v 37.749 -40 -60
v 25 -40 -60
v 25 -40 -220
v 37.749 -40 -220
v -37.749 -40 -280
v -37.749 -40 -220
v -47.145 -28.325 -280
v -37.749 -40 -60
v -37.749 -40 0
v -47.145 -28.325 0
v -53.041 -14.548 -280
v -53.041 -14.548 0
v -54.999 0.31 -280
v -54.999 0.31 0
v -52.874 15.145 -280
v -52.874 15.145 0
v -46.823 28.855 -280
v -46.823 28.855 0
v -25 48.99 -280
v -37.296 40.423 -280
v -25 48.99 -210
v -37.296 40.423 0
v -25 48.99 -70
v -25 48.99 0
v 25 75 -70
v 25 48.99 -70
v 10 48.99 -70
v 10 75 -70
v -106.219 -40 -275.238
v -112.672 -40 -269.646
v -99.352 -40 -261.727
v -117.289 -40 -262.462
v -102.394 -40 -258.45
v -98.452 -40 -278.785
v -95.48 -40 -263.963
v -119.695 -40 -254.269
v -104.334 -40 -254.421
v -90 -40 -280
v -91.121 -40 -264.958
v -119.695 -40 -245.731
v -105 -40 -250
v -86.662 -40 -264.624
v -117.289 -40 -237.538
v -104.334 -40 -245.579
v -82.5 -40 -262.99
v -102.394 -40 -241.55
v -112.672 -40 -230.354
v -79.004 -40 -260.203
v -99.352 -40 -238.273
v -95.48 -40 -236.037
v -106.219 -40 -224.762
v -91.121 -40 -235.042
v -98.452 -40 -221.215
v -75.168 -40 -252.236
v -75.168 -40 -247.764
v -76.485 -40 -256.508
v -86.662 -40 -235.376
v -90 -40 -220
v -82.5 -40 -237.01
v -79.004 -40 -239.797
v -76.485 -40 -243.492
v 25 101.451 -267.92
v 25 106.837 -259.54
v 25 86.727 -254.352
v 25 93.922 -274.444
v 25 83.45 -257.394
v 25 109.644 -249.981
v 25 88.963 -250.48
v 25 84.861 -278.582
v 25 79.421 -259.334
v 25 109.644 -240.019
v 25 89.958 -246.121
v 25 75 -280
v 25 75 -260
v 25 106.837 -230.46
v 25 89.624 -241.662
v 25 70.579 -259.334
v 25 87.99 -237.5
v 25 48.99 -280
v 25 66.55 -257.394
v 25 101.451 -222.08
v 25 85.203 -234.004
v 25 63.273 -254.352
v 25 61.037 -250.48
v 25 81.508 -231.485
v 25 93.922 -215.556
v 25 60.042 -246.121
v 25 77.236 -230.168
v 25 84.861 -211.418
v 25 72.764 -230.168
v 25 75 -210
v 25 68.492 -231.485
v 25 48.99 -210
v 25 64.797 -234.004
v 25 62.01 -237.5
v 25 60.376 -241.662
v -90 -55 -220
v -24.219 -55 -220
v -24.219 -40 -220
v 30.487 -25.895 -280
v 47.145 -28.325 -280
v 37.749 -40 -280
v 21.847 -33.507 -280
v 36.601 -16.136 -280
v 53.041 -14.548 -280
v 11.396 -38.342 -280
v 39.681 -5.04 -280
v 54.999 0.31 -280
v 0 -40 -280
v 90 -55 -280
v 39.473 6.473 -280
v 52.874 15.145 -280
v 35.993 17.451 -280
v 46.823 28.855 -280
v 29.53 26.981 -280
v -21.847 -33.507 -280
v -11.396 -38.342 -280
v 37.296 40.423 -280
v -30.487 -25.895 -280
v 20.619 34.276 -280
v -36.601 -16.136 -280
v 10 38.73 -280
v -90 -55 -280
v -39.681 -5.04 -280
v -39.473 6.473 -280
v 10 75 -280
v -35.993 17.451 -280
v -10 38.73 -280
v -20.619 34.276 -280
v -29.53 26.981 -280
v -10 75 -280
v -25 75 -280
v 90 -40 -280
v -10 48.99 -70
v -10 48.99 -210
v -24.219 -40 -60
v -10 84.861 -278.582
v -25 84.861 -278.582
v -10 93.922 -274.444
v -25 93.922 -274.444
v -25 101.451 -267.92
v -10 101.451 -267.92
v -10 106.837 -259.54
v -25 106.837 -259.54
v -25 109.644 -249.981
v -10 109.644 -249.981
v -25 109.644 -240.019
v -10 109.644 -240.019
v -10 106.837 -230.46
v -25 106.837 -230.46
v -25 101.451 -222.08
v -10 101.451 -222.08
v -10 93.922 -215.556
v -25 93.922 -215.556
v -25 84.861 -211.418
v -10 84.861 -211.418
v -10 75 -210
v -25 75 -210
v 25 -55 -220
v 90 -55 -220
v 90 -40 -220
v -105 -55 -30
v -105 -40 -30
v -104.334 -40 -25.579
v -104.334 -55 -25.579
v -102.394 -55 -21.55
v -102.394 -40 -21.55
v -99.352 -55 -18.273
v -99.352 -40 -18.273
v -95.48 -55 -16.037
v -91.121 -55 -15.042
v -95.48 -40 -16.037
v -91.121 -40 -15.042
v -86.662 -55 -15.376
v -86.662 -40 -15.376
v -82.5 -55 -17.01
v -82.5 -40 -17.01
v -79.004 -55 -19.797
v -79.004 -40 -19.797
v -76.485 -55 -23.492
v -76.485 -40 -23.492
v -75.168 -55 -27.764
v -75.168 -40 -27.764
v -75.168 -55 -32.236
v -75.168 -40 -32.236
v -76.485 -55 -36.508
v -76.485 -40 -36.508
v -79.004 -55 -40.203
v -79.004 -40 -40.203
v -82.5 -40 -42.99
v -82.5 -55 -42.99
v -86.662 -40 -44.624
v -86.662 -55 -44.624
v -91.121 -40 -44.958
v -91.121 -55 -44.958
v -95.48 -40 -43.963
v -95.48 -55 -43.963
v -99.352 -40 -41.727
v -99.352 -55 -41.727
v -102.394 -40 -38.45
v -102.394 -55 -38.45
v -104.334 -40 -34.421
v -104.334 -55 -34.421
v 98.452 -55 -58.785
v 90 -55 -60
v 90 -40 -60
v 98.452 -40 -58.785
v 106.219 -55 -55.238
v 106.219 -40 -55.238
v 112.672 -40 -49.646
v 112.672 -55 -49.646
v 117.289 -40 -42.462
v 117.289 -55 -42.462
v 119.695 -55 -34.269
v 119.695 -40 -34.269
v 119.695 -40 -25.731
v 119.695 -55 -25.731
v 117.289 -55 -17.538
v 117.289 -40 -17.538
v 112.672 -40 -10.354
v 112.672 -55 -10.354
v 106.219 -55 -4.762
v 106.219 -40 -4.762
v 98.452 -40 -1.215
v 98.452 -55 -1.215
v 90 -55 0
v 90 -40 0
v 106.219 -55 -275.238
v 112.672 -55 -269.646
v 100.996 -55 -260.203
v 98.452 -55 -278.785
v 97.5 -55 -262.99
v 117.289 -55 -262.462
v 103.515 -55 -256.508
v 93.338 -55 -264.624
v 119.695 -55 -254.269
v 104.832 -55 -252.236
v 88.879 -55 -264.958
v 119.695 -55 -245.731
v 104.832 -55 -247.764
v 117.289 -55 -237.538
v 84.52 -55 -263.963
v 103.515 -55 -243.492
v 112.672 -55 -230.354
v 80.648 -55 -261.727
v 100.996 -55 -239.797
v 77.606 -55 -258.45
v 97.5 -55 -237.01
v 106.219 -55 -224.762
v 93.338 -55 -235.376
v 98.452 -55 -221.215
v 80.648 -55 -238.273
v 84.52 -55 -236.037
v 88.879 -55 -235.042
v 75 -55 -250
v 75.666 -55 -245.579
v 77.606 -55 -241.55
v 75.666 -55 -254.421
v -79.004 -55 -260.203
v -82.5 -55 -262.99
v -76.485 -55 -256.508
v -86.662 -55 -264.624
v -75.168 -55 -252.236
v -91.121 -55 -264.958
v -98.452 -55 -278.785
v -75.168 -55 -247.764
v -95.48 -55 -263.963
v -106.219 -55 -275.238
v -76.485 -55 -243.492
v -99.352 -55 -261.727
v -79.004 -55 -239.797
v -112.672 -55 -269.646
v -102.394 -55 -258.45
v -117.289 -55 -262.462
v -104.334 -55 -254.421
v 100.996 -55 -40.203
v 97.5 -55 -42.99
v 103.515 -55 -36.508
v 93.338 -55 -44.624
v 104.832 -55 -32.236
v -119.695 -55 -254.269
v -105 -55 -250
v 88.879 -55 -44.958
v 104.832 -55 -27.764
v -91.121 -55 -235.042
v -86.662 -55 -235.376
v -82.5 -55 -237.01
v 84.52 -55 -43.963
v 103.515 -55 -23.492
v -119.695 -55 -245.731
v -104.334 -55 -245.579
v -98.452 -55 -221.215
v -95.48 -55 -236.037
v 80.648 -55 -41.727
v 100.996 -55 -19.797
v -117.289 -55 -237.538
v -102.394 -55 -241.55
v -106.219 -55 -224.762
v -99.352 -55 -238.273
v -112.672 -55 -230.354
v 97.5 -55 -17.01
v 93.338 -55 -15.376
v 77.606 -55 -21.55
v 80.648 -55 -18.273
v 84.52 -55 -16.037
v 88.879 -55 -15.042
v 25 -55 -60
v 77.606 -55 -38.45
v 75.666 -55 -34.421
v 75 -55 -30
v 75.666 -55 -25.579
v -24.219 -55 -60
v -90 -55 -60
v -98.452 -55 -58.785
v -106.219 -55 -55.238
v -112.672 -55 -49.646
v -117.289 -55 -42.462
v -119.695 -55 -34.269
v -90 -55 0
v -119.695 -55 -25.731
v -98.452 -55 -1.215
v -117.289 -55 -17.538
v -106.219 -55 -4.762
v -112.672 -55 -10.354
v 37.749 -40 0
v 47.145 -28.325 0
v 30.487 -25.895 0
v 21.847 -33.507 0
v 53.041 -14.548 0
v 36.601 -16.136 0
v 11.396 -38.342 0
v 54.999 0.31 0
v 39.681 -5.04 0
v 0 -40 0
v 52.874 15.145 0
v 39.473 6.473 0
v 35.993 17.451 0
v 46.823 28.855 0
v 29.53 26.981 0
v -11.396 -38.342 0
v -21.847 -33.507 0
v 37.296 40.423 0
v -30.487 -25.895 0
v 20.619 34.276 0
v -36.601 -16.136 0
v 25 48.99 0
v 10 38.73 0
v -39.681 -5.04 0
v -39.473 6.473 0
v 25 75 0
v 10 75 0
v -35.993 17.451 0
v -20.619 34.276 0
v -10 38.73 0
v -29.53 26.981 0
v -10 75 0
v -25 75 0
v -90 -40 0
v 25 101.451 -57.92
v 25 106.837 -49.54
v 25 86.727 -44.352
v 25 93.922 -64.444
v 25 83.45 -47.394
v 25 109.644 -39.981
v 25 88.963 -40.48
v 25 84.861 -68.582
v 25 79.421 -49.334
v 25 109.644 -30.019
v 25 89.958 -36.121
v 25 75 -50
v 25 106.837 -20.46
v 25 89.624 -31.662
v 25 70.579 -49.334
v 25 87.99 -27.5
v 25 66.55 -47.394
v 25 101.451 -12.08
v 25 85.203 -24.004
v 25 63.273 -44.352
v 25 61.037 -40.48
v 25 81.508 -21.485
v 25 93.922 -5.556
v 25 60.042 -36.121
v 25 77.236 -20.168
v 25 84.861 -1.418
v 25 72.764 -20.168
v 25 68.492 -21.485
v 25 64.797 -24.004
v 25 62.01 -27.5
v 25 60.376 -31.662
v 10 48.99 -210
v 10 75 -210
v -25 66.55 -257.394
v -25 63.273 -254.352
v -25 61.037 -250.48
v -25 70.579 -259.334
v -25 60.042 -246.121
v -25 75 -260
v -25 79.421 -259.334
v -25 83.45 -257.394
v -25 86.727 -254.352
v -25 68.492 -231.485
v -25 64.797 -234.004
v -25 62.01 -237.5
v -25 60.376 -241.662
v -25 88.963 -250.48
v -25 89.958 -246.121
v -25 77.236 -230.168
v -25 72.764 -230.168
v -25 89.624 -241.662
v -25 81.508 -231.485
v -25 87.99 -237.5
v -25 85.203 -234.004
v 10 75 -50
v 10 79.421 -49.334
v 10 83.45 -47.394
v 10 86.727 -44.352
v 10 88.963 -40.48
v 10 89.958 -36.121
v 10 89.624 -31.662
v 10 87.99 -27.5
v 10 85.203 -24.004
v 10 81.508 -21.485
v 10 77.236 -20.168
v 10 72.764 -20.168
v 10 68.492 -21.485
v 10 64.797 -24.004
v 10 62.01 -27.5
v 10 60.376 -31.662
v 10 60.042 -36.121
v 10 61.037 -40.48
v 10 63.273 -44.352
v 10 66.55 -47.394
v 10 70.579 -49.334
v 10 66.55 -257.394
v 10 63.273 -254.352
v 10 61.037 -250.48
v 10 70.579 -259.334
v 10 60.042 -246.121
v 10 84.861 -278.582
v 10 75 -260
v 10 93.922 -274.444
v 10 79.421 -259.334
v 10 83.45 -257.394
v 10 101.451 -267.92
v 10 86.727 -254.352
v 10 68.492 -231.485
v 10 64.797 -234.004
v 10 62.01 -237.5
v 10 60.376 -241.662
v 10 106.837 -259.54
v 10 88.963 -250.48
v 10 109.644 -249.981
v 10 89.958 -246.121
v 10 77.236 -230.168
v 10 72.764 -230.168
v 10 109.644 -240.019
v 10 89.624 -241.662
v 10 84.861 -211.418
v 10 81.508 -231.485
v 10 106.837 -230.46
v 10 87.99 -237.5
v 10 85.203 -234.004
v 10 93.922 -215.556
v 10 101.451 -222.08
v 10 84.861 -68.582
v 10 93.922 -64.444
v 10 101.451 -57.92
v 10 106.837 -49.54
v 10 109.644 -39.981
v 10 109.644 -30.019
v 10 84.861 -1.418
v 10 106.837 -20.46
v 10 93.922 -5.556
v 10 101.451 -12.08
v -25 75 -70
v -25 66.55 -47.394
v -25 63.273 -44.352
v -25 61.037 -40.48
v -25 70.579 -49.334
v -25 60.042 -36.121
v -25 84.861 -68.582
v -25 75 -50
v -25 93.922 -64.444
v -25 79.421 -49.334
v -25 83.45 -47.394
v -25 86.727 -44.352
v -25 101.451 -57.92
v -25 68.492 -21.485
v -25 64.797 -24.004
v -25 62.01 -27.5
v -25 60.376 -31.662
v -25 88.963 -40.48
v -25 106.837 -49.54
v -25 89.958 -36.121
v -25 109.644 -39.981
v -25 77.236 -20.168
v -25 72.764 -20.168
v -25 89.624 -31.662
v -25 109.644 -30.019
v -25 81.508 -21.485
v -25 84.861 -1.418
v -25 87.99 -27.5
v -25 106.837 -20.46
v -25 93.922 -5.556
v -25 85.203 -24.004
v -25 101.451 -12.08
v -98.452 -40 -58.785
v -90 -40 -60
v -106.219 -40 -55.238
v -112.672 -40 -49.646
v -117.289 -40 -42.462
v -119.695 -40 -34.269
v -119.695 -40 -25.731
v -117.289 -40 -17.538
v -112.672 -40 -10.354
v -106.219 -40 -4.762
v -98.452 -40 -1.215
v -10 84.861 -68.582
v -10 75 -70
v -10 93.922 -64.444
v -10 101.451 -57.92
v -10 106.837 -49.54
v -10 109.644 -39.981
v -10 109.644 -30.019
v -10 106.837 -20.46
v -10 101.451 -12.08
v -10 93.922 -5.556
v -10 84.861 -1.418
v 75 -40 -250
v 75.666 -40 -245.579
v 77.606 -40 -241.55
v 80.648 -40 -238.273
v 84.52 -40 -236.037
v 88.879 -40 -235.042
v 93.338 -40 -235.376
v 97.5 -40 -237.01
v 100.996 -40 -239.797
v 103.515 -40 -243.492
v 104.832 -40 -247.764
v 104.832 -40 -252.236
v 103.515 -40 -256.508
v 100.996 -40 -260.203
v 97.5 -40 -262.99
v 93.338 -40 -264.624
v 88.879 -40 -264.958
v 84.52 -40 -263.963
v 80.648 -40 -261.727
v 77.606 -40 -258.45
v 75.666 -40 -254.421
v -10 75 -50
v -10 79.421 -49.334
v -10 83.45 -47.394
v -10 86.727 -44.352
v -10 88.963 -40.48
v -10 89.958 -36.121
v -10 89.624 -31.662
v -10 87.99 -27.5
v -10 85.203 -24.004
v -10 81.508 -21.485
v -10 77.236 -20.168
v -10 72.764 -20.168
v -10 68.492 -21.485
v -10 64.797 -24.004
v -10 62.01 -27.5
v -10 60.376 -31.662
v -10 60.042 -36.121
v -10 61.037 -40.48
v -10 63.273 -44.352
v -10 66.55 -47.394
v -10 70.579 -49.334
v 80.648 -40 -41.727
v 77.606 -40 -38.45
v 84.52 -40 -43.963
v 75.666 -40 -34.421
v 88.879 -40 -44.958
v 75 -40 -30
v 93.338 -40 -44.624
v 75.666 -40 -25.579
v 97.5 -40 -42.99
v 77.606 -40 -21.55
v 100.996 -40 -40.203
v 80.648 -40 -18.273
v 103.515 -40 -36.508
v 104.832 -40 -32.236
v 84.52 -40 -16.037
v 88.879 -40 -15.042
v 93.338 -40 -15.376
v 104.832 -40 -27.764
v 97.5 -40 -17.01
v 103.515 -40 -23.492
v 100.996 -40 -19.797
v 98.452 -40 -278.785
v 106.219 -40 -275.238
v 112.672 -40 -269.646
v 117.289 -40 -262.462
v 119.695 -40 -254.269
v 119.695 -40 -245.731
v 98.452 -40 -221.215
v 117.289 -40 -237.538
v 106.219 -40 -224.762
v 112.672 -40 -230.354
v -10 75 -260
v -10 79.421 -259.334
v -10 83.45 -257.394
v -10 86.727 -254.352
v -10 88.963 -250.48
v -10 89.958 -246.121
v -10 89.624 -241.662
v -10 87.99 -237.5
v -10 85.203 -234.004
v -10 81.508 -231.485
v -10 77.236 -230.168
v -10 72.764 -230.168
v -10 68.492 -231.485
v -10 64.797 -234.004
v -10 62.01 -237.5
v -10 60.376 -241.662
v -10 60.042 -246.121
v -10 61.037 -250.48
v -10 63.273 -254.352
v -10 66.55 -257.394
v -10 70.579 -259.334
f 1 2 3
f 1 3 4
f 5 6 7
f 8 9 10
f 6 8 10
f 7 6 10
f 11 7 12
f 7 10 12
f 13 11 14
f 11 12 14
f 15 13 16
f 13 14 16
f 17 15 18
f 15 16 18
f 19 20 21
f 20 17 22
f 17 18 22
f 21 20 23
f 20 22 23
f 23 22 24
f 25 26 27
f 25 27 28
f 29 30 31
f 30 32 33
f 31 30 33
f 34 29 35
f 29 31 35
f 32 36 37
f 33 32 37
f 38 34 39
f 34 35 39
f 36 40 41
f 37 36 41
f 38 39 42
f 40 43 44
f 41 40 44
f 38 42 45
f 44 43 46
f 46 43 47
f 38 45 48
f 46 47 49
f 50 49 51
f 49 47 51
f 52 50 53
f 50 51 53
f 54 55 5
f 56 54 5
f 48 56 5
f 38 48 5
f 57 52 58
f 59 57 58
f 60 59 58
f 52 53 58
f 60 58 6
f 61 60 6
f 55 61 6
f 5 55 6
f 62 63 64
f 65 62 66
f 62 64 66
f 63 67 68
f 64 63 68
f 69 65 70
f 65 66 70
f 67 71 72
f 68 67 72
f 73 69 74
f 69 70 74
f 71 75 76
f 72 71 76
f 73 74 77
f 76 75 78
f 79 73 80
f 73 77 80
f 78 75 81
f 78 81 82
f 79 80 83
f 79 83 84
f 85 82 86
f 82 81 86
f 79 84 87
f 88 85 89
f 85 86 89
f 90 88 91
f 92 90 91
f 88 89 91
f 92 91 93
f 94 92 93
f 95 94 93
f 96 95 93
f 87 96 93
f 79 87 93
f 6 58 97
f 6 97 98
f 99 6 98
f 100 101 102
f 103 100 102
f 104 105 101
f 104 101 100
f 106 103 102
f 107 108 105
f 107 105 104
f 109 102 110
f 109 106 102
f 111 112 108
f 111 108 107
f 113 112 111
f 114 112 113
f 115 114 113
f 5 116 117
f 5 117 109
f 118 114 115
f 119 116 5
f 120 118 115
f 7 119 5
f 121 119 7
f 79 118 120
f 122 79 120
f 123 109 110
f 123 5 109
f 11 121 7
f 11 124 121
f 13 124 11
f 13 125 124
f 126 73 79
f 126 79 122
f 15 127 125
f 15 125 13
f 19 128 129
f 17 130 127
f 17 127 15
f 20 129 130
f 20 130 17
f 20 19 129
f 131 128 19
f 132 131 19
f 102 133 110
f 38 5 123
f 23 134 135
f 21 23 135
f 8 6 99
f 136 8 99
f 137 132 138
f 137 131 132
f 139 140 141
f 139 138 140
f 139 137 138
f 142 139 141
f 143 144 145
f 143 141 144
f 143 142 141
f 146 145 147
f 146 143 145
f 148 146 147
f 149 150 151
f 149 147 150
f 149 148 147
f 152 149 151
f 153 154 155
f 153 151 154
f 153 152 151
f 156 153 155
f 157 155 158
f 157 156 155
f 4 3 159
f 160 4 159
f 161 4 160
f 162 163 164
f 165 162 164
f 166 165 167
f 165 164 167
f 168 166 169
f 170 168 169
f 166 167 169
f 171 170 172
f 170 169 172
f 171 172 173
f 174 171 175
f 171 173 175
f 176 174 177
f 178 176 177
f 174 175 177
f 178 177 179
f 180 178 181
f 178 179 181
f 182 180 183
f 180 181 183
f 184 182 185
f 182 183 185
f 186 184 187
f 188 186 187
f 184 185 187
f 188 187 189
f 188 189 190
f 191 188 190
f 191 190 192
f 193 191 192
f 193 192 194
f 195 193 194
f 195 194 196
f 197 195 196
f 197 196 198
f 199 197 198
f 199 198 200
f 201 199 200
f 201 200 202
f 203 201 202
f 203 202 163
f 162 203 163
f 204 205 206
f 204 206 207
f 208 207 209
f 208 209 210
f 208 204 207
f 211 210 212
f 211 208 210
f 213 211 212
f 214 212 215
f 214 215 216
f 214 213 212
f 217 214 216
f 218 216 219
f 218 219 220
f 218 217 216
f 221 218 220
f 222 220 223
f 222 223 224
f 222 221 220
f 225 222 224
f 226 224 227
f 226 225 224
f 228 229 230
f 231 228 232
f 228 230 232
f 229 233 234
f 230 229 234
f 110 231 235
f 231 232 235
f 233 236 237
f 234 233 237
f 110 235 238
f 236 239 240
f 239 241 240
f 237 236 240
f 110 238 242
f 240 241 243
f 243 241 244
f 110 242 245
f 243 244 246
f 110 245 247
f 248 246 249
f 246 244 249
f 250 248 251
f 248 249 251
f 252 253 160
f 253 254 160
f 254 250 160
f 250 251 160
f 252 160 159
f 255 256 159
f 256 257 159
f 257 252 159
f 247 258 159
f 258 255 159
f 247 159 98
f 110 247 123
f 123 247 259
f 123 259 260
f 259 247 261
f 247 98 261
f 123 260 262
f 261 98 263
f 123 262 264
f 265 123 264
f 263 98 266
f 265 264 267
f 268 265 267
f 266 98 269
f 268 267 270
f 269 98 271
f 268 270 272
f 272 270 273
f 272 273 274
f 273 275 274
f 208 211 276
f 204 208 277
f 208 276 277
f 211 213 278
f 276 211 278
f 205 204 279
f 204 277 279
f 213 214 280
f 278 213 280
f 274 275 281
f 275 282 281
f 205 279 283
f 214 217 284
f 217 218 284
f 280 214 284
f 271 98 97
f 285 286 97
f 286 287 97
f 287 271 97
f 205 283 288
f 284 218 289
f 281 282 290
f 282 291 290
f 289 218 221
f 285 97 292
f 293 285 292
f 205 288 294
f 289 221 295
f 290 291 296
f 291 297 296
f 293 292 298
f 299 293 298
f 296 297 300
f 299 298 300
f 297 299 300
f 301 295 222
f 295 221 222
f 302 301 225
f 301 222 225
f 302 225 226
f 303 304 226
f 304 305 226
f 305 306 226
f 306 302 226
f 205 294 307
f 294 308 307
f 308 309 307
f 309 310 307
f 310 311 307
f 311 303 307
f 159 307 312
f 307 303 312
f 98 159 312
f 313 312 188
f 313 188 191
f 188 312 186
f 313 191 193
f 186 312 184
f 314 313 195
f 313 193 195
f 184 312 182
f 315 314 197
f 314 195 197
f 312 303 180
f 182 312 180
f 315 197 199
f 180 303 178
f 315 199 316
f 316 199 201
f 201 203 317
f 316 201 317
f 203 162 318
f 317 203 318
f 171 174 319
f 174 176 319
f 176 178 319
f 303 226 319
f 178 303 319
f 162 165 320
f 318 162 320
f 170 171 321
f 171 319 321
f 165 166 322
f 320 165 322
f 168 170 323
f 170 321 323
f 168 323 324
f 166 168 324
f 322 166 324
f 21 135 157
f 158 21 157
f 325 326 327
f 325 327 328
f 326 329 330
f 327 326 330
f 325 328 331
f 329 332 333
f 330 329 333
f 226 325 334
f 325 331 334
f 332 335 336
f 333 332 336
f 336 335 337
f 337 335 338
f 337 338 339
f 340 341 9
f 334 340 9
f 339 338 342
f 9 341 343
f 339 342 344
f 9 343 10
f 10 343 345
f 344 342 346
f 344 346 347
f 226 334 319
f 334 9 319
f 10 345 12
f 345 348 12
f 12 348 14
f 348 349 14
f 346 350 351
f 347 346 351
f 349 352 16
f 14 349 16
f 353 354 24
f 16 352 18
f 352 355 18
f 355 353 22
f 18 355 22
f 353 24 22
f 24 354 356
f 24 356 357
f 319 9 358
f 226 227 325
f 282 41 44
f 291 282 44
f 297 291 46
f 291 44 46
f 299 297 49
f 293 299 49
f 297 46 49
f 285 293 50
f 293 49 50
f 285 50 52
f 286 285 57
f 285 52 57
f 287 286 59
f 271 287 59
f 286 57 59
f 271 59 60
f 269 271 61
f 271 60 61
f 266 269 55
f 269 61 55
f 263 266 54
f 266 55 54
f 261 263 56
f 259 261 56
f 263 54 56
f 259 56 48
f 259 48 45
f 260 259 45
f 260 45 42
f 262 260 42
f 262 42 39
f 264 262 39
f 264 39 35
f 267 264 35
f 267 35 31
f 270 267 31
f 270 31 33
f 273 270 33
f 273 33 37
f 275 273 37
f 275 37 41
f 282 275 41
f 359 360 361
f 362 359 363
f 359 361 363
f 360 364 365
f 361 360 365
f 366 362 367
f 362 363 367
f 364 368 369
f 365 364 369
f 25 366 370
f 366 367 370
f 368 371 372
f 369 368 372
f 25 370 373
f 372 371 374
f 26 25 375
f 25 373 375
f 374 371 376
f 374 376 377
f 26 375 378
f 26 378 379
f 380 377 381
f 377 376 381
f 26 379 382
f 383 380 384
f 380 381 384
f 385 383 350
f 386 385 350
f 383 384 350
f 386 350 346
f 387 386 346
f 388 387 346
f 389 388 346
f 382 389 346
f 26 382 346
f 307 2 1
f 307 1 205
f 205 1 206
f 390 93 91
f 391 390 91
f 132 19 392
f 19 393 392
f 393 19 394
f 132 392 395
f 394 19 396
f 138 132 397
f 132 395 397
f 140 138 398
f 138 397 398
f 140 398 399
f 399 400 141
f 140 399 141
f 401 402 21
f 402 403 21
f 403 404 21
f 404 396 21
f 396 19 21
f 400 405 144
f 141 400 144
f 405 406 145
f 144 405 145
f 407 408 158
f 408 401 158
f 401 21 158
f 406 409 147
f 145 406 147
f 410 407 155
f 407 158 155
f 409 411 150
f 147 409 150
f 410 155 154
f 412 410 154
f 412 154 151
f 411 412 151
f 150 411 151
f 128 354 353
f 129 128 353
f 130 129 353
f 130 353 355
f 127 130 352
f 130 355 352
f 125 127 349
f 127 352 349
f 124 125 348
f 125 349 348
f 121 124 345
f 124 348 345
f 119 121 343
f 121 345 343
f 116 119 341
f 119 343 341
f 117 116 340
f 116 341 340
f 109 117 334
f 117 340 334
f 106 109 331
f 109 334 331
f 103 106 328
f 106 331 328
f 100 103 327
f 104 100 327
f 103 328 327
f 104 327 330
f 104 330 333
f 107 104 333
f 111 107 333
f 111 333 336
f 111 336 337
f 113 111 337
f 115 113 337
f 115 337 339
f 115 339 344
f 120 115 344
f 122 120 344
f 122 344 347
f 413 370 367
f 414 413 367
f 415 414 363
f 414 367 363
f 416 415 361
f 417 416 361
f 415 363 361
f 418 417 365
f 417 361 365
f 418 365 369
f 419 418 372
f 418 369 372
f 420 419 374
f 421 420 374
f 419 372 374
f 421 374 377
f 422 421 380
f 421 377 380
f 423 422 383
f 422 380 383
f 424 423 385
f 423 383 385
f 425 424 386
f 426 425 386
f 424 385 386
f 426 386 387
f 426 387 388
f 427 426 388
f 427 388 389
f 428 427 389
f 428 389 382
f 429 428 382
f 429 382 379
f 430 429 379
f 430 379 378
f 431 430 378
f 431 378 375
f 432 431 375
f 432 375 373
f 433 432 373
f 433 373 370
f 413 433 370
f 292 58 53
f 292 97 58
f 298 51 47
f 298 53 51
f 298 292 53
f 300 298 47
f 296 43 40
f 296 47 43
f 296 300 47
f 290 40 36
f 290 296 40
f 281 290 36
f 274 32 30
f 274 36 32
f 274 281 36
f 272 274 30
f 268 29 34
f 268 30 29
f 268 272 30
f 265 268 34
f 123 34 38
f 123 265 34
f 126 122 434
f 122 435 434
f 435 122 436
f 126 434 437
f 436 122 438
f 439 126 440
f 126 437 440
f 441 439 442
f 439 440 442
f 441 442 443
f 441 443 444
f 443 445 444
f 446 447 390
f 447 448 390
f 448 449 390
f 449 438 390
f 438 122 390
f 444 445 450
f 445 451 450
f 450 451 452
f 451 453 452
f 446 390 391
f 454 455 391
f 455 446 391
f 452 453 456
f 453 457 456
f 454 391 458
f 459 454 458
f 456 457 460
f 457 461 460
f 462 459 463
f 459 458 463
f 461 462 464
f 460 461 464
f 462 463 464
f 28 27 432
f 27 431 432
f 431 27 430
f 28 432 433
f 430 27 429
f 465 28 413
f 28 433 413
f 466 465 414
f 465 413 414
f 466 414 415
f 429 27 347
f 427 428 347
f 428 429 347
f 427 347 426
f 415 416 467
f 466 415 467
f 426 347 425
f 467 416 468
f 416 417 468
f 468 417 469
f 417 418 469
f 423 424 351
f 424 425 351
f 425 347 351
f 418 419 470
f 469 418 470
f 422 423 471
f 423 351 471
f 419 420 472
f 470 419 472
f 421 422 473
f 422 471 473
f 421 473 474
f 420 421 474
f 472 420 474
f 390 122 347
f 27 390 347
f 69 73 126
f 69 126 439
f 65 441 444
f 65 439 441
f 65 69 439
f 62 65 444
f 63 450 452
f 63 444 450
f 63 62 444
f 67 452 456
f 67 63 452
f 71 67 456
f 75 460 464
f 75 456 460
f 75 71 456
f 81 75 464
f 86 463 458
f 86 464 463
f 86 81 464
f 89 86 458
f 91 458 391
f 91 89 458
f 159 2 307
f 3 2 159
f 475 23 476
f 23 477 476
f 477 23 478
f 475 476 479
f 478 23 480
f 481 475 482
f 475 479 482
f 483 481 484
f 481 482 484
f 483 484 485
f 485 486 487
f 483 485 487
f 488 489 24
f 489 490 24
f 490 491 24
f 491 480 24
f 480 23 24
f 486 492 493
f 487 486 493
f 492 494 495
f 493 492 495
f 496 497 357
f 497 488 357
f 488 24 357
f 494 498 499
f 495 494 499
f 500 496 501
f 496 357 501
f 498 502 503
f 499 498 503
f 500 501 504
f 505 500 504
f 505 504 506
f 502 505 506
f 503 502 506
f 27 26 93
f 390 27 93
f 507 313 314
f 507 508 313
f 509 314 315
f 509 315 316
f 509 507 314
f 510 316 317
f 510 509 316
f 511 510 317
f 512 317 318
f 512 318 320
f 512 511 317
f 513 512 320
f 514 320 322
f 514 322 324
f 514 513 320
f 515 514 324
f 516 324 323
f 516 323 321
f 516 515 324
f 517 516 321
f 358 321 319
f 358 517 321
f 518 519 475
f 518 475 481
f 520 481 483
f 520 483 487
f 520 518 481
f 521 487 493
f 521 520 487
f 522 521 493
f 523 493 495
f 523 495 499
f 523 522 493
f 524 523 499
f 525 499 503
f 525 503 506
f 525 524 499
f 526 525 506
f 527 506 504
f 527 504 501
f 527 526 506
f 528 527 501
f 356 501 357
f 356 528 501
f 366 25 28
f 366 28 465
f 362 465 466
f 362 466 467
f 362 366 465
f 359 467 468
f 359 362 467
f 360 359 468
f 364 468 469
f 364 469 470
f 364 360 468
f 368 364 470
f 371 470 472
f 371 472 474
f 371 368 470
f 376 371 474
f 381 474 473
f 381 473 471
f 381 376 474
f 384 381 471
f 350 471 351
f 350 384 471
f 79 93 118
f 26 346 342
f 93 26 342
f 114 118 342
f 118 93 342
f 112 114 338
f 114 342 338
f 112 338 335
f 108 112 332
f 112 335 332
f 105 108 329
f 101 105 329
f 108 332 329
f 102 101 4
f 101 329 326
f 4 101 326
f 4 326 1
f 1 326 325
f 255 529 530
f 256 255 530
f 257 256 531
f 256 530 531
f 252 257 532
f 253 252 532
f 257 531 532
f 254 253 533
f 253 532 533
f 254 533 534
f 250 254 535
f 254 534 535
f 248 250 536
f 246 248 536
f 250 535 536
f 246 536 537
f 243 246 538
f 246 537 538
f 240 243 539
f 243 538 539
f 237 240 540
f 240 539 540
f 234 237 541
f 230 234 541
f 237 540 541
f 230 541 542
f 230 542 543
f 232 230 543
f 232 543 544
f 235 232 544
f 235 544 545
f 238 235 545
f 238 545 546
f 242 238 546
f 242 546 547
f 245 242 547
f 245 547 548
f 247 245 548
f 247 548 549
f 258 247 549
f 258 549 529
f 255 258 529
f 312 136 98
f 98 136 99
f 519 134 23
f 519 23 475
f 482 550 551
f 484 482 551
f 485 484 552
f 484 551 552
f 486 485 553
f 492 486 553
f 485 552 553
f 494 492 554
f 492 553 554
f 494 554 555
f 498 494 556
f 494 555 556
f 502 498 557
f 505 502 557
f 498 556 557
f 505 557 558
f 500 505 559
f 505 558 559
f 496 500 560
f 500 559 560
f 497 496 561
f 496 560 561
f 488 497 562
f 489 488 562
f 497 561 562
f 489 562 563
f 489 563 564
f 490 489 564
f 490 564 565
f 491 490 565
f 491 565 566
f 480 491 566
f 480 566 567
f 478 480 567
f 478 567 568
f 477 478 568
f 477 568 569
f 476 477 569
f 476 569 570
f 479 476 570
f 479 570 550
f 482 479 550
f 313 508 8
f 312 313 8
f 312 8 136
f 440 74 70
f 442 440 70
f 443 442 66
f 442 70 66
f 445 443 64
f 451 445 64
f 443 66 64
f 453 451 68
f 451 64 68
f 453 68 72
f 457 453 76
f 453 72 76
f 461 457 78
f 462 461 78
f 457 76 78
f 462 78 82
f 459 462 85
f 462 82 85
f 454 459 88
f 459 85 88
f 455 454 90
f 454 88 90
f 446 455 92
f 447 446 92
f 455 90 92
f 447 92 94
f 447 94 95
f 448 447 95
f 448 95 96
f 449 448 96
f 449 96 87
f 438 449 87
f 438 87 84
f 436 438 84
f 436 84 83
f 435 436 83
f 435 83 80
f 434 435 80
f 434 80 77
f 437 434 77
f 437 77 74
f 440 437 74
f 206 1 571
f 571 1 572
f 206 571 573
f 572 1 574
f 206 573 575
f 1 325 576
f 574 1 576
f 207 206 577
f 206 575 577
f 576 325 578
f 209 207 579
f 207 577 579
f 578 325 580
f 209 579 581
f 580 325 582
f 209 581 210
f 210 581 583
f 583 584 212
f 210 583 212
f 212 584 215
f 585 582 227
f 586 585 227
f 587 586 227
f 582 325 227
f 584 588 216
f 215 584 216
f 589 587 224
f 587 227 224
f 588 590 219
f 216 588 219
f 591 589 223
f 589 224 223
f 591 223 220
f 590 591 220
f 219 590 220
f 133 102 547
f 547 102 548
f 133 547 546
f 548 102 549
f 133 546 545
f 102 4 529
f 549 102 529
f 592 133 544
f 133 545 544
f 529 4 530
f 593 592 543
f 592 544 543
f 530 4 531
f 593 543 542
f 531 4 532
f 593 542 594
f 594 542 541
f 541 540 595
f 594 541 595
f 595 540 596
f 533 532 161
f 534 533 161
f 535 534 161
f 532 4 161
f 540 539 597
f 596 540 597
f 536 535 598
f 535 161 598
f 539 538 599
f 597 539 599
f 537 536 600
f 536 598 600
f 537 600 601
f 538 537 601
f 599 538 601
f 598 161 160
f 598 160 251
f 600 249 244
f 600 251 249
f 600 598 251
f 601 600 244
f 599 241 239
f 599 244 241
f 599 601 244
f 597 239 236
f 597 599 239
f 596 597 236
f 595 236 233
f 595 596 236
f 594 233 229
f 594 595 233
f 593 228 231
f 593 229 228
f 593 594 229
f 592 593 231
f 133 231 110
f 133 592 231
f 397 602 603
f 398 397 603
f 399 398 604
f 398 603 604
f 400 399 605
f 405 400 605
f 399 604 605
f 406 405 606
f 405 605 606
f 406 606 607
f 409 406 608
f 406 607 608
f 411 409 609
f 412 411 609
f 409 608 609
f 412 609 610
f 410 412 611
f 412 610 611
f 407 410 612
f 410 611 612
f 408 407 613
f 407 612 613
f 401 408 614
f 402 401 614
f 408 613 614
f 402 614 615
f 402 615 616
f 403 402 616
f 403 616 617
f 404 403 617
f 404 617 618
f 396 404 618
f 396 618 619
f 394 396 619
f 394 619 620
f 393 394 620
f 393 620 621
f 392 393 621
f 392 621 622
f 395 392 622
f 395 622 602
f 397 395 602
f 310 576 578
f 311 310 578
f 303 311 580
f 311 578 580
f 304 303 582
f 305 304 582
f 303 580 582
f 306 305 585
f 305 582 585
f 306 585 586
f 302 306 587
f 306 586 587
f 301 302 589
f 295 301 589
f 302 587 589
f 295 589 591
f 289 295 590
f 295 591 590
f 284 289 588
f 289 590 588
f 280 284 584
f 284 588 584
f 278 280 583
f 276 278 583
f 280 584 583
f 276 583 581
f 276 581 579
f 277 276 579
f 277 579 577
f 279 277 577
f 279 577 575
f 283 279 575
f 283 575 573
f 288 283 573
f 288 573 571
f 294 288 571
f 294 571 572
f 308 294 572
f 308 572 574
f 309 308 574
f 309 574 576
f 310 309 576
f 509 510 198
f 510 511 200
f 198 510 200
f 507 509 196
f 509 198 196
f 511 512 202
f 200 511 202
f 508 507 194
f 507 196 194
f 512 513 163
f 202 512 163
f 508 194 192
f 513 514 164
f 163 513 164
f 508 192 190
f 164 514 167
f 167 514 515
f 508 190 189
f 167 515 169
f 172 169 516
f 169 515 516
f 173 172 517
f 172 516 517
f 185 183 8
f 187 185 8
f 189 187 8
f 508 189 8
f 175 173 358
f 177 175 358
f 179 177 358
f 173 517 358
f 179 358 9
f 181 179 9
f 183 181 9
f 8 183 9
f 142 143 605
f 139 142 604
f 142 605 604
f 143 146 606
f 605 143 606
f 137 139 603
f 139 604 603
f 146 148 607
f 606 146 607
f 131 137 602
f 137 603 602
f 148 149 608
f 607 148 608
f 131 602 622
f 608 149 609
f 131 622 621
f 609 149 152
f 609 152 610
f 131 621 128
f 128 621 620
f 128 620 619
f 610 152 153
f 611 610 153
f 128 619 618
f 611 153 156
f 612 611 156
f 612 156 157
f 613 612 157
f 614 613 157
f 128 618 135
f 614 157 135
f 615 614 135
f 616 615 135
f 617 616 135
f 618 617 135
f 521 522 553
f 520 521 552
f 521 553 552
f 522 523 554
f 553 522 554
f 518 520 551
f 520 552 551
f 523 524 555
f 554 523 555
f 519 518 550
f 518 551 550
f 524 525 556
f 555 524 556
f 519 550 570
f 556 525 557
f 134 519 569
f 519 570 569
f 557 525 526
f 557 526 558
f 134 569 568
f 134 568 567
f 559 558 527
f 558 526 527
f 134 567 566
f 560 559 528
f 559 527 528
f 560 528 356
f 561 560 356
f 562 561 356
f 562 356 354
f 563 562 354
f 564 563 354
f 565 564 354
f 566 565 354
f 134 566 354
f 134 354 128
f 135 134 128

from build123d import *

# Parameters (mm, degrees)
BOSS_EXTRUDE1_DEPTH = 280
SKETCH5_W           = 95
SKETCH5_H           = 160
SKETCH5_W_2         = 95.780958046
CUT_EXTRUDE9_DEPTH  = 280
FILLET1_RADIUS      = 30
FILLET1_LENGTH      = 15
FILLET2_RADIUS      = 30
FILLET2_LENGTH      = 15
FILLET3_RADIUS      = 30
FILLET3_LENGTH      = 15
FILLET4_RADIUS      = 30
FILLET4_LENGTH      = 15
SKETCH7_R           = 15
CUT_EXTRUDE10_DEPTH = 280
SKETCH8_W           = 140
SKETCH8_H           = 61.010205144
CUT_EXTRUDE11_DEPTH = 280
FILLET5_RADIUS      = 35
FILLET5_LENGTH      = 15
FILLET6_RADIUS      = 35
FILLET6_LENGTH      = 15
FILLET7_RADIUS      = 35
FILLET7_LENGTH      = 15
FILLET8_RADIUS      = 35
FILLET8_LENGTH      = 15
SKETCH9_R           = 15
CUT_EXTRUDE12_DEPTH = 280


with BuildPart() as part:
    # Sketch1 → Boss-Extrude1 (new body)
    with BuildSketch(Plane.XY):
        with BuildLine():
            Line((-120, -40), (-37.749172176, -40))
            ThreePointArc((-37.749172176, -40), (-54.444104817, 7.799964787), (-25, 48.989794856))
            Line((-25, 48.989794856), (-25, 110))
            Line((-25, 110), (-10, 110))
            Line((-10, 110), (-10, 38.729833462))
            ThreePointArc((-10, 38.729833462), (0, -40), (10, 38.729833462))
            Line((10, 38.729833462), (10, 110))
            Line((10, 110), (25, 110))
            Line((25, 110), (25, 48.989794856))
            ThreePointArc((25, 48.989794856), (54.444104817, 7.799964787), (37.749172176, -40))
            Line((37.749172176, -40), (120, -40))
            Line((120, -40), (120, -55))
            Line((120, -55), (-120, -55))
            Line((-120, -55), (-120, -40))
        make_face()
    extrude(amount=-BOSS_EXTRUDE1_DEPTH)

    # Sketch5 → Cut-Extrude9 (cut)
    with BuildSketch(Plane(origin=(0, -40, 0), x_dir=(1, 0, 0), z_dir=(0, 1, 0))):
        with Locations((72.5, 140)):
            Rectangle(SKETCH5_W, SKETCH5_H)
        with Locations((-72.109520977, 140)):
            Rectangle(SKETCH5_W_2, SKETCH5_H)
    extrude(amount=-CUT_EXTRUDE9_DEPTH, mode=Mode.SUBTRACT)

    # Fillet1: full round fillet: the end face becomes a half cylinder, R = half its width
    fillet1_face = Plane((-120, -47.5, -250), x_dir=(0, -1, 0), z_dir=(-1, 0, 0))  # on the end face: x along it, z out of the body
    fillet1_slab = fillet1_face.offset(-FILLET1_RADIUS / 2) * Box(FILLET1_LENGTH, 2 * FILLET1_RADIUS, FILLET1_RADIUS, mode=Mode.PRIVATE)  # the body's end, R deep
    fillet1_round = Plane((-90, -47.5, -250), x_dir=(-1, 0, 0), z_dir=(0, -1, 0)) * Cylinder(FILLET1_RADIUS, FILLET1_LENGTH, mode=Mode.PRIVATE)  # its axis R under the face
    add(fillet1_slab - fillet1_round, mode=Mode.SUBTRACT)

    # Fillet2: full round fillet: the end face becomes a half cylinder, R = half its width
    fillet2_face = Plane((-120, -47.5, -30), x_dir=(0, 1, 0), z_dir=(-1, 0, 0))  # on the end face: x along it, z out of the body
    fillet2_slab = fillet2_face.offset(-FILLET2_RADIUS / 2) * Box(FILLET2_LENGTH, 2 * FILLET2_RADIUS, FILLET2_RADIUS, mode=Mode.PRIVATE)  # the body's end, R deep
    fillet2_round = Plane((-90, -47.5, -30), x_dir=(-1, 0, 0), z_dir=(0, 1, 0)) * Cylinder(FILLET2_RADIUS, FILLET2_LENGTH, mode=Mode.PRIVATE)  # its axis R under the face
    add(fillet2_slab - fillet2_round, mode=Mode.SUBTRACT)

    # Fillet3: full round fillet: the end face becomes a half cylinder, R = half its width
    fillet3_face = Plane((120, -47.5, -250), x_dir=(0, 1, 0), z_dir=(1, 0, 0))  # on the end face: x along it, z out of the body
    fillet3_slab = fillet3_face.offset(-FILLET3_RADIUS / 2) * Box(FILLET3_LENGTH, 2 * FILLET3_RADIUS, FILLET3_RADIUS, mode=Mode.PRIVATE)  # the body's end, R deep
    fillet3_round = Plane((90, -47.5, -250), x_dir=(1, 0, 0), z_dir=(0, 1, 0)) * Cylinder(FILLET3_RADIUS, FILLET3_LENGTH, mode=Mode.PRIVATE)  # its axis R under the face
    add(fillet3_slab - fillet3_round, mode=Mode.SUBTRACT)

    # Fillet4: full round fillet: the end face becomes a half cylinder, R = half its width
    fillet4_face = Plane((120, -47.5, -30), x_dir=(0, -1, 0), z_dir=(1, 0, 0))  # on the end face: x along it, z out of the body
    fillet4_slab = fillet4_face.offset(-FILLET4_RADIUS / 2) * Box(FILLET4_LENGTH, 2 * FILLET4_RADIUS, FILLET4_RADIUS, mode=Mode.PRIVATE)  # the body's end, R deep
    fillet4_round = Plane((90, -47.5, -30), x_dir=(1, 0, 0), z_dir=(0, -1, 0)) * Cylinder(FILLET4_RADIUS, FILLET4_LENGTH, mode=Mode.PRIVATE)  # its axis R under the face
    add(fillet4_slab - fillet4_round, mode=Mode.SUBTRACT)

    # Sketch7 → Cut-Extrude10 (cut)
    with BuildSketch(Plane(origin=(0, -40, 0), x_dir=(1, 0, 0), z_dir=(0, 1, 0))):
        with Locations(Location((-90, 250, 0), (0, 0, 180))):
            Circle(SKETCH7_R)
        with Locations(Location((90, 250, 0), (0, 0, 180))):
            Circle(SKETCH7_R)
        with Locations(Location((90, 30, 0), (0, 0, 180))):
            Circle(SKETCH7_R)
        with Locations(Location((-90, 30, 0), (0, 0, 180))):
            Circle(SKETCH7_R)
    extrude(amount=-CUT_EXTRUDE10_DEPTH, mode=Mode.SUBTRACT)

    # Sketch8 → Cut-Extrude11 (cut)
    with BuildSketch(Plane(origin=(25, 0, 0), x_dir=(0, 0, -1), z_dir=(1, 0, 0))):
        with Locations((140, 79.494897428)):
            Rectangle(SKETCH8_W, SKETCH8_H)
    extrude(amount=-CUT_EXTRUDE11_DEPTH, mode=Mode.SUBTRACT)

    # Fillet5: full round fillet: the end face becomes a half cylinder, R = half its width
    fillet5_face = Plane((17.5, 110, -35), x_dir=(1, 0, 0), z_dir=(0, 1, 0))  # on the end face: x along it, z out of the body
    fillet5_slab = fillet5_face.offset(-FILLET5_RADIUS / 2) * Box(FILLET5_LENGTH, 2 * FILLET5_RADIUS, FILLET5_RADIUS, mode=Mode.PRIVATE)  # the body's end, R deep
    fillet5_round = Plane((17.5, 75, -35), x_dir=(0, 1, 0), z_dir=(1, 0, 0)) * Cylinder(FILLET5_RADIUS, FILLET5_LENGTH, mode=Mode.PRIVATE)  # its axis R under the face
    add(fillet5_slab - fillet5_round, mode=Mode.SUBTRACT)

    # Fillet6: full round fillet: the end face becomes a half cylinder, R = half its width
    fillet6_face = Plane((-17.5, 110, -35), x_dir=(1, 0, 0), z_dir=(0, 1, 0))  # on the end face: x along it, z out of the body
    fillet6_slab = fillet6_face.offset(-FILLET6_RADIUS / 2) * Box(FILLET6_LENGTH, 2 * FILLET6_RADIUS, FILLET6_RADIUS, mode=Mode.PRIVATE)  # the body's end, R deep
    fillet6_round = Plane((-17.5, 75, -35), x_dir=(0, 1, 0), z_dir=(1, 0, 0)) * Cylinder(FILLET6_RADIUS, FILLET6_LENGTH, mode=Mode.PRIVATE)  # its axis R under the face
    add(fillet6_slab - fillet6_round, mode=Mode.SUBTRACT)

    # Fillet7: full round fillet: the end face becomes a half cylinder, R = half its width
    fillet7_face = Plane((-17.5, 110, -245), x_dir=(1, 0, 0), z_dir=(0, 1, 0))  # on the end face: x along it, z out of the body
    fillet7_slab = fillet7_face.offset(-FILLET7_RADIUS / 2) * Box(FILLET7_LENGTH, 2 * FILLET7_RADIUS, FILLET7_RADIUS, mode=Mode.PRIVATE)  # the body's end, R deep
    fillet7_round = Plane((-17.5, 75, -245), x_dir=(0, 1, 0), z_dir=(1, 0, 0)) * Cylinder(FILLET7_RADIUS, FILLET7_LENGTH, mode=Mode.PRIVATE)  # its axis R under the face
    add(fillet7_slab - fillet7_round, mode=Mode.SUBTRACT)

    # Fillet8: full round fillet: the end face becomes a half cylinder, R = half its width
    fillet8_face = Plane((17.5, 110, -245), x_dir=(1, 0, 0), z_dir=(0, 1, 0))  # on the end face: x along it, z out of the body
    fillet8_slab = fillet8_face.offset(-FILLET8_RADIUS / 2) * Box(FILLET8_LENGTH, 2 * FILLET8_RADIUS, FILLET8_RADIUS, mode=Mode.PRIVATE)  # the body's end, R deep
    fillet8_round = Plane((17.5, 75, -245), x_dir=(0, 1, 0), z_dir=(1, 0, 0)) * Cylinder(FILLET8_RADIUS, FILLET8_LENGTH, mode=Mode.PRIVATE)  # its axis R under the face
    add(fillet8_slab - fillet8_round, mode=Mode.SUBTRACT)

    # Sketch9 → Cut-Extrude12 (cut)
    with BuildSketch(Plane(origin=(25, 0, 0), x_dir=(0, 0, -1), z_dir=(1, 0, 0))):
        with Locations((35, 75)):
            Circle(SKETCH9_R)
        with Locations((245, 75)):
            Circle(SKETCH9_R)
    extrude(amount=-CUT_EXTRUDE12_DEPTH, mode=Mode.SUBTRACT)


solid = part.part
